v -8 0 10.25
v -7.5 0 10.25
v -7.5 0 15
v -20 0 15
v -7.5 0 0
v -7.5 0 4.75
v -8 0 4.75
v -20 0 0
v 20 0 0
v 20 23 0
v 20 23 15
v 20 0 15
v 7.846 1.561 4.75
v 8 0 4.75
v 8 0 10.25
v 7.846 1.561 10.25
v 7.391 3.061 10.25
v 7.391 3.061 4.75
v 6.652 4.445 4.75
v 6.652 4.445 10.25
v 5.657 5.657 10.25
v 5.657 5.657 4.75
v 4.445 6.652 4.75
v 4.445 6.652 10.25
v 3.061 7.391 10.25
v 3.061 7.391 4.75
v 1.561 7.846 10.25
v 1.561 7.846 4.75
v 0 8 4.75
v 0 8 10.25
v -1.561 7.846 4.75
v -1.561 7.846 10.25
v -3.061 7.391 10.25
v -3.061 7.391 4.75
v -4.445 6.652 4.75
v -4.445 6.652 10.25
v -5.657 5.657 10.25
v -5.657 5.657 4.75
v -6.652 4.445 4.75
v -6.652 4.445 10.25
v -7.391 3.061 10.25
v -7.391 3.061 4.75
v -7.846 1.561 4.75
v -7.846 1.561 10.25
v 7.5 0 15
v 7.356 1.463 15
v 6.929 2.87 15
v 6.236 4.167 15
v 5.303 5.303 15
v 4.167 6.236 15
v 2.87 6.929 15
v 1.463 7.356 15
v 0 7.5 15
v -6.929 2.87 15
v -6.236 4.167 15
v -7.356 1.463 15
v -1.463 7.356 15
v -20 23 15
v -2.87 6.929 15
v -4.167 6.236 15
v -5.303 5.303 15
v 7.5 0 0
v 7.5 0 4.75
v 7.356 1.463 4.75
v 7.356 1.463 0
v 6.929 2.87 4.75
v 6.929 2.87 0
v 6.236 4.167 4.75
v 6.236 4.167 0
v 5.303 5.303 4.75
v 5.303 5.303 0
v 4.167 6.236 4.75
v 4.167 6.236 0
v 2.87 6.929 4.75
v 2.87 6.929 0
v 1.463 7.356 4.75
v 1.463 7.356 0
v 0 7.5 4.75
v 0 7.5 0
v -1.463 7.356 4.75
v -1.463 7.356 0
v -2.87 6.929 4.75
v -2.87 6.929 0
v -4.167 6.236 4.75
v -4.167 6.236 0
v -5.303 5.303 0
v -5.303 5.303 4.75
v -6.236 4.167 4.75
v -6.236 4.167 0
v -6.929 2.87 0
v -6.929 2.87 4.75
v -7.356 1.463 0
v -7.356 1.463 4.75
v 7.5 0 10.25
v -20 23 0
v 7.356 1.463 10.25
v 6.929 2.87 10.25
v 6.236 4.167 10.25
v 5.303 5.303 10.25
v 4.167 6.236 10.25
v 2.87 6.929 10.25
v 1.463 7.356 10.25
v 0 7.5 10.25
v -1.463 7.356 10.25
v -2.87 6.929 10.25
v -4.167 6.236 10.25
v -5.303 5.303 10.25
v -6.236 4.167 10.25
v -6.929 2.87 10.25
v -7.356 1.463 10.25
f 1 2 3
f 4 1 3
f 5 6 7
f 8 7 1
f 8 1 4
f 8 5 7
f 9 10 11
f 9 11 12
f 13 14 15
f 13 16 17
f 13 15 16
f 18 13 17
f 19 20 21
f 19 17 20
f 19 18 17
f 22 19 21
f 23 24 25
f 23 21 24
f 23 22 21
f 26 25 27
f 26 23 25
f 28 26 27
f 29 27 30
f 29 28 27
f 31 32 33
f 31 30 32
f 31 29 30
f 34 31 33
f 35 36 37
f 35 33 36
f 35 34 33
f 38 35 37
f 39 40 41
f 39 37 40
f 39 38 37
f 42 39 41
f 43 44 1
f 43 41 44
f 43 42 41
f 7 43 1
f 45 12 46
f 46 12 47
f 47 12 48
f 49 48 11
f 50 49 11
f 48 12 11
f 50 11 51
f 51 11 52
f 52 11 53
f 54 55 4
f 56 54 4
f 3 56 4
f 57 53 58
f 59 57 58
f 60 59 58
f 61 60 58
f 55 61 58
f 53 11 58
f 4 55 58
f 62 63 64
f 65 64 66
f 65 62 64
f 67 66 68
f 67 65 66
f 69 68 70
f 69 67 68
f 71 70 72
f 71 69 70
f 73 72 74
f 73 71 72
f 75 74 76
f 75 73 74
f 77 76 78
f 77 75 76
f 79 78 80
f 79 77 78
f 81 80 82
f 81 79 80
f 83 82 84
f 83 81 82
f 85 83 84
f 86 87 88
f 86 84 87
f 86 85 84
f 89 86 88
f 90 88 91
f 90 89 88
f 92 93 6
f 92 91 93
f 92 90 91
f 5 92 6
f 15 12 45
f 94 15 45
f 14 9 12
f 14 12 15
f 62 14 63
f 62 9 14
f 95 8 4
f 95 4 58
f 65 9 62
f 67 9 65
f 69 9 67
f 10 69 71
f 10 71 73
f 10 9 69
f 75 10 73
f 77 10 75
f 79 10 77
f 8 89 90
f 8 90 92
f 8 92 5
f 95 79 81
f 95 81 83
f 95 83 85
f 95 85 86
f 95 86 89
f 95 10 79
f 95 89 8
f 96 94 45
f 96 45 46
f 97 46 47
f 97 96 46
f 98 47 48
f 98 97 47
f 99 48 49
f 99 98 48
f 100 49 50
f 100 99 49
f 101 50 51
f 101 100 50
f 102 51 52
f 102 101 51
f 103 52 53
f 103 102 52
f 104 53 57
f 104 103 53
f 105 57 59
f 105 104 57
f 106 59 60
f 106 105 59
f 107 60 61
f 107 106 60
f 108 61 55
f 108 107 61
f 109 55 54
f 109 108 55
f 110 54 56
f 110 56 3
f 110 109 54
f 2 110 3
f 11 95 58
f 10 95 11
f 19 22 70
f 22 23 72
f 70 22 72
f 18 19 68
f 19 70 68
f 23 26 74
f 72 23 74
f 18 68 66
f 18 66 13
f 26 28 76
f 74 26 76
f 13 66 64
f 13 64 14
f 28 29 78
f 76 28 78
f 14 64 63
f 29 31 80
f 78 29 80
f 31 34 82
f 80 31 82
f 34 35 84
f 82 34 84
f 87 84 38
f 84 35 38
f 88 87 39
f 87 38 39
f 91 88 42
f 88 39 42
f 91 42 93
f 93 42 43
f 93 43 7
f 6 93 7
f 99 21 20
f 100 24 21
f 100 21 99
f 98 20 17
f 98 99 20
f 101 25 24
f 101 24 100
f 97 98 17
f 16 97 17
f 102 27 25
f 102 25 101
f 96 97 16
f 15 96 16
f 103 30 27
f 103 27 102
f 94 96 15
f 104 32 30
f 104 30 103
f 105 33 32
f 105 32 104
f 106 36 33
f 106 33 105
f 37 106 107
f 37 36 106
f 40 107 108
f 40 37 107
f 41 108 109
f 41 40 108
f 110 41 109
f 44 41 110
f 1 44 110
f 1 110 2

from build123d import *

# Parameters (mm, degrees)
BOSS_EXTRUDE1_DEPTH = 15
SKETCH2_W           = 5.5
SKETCH2_H           = 1.517546376


with BuildPart() as part:
    # Sketch1 → Boss-Extrude1 (new body)
    with BuildSketch(Plane.XY):
        with BuildLine():
            Line((-20, 0), (-20, 23))
            Line((-20, 23), (20, 23))
            Line((20, 23), (20, 0))
            Line((20, 0), (7.5, 0))
            ThreePointArc((7.5, 0), (0, 7.5), (-7.5, 0))
            Line((-7.5, 0), (-20, 0))
        make_face()
    extrude(amount=BOSS_EXTRUDE1_DEPTH)

    # Sketch2 → Cut-Revolve2 (revolve, cut)
    with BuildSketch(Plane(origin=(0, 0, 0), x_dir=(0, 0, -1), z_dir=(1, 0, 0))):
        with Locations((-7.5, 7.241226812)):
            Rectangle(SKETCH2_W, SKETCH2_H)
    revolve(axis=Axis((0, 0, 0), (0, 0, 1)), mode=Mode.SUBTRACT)


solid = part.part
